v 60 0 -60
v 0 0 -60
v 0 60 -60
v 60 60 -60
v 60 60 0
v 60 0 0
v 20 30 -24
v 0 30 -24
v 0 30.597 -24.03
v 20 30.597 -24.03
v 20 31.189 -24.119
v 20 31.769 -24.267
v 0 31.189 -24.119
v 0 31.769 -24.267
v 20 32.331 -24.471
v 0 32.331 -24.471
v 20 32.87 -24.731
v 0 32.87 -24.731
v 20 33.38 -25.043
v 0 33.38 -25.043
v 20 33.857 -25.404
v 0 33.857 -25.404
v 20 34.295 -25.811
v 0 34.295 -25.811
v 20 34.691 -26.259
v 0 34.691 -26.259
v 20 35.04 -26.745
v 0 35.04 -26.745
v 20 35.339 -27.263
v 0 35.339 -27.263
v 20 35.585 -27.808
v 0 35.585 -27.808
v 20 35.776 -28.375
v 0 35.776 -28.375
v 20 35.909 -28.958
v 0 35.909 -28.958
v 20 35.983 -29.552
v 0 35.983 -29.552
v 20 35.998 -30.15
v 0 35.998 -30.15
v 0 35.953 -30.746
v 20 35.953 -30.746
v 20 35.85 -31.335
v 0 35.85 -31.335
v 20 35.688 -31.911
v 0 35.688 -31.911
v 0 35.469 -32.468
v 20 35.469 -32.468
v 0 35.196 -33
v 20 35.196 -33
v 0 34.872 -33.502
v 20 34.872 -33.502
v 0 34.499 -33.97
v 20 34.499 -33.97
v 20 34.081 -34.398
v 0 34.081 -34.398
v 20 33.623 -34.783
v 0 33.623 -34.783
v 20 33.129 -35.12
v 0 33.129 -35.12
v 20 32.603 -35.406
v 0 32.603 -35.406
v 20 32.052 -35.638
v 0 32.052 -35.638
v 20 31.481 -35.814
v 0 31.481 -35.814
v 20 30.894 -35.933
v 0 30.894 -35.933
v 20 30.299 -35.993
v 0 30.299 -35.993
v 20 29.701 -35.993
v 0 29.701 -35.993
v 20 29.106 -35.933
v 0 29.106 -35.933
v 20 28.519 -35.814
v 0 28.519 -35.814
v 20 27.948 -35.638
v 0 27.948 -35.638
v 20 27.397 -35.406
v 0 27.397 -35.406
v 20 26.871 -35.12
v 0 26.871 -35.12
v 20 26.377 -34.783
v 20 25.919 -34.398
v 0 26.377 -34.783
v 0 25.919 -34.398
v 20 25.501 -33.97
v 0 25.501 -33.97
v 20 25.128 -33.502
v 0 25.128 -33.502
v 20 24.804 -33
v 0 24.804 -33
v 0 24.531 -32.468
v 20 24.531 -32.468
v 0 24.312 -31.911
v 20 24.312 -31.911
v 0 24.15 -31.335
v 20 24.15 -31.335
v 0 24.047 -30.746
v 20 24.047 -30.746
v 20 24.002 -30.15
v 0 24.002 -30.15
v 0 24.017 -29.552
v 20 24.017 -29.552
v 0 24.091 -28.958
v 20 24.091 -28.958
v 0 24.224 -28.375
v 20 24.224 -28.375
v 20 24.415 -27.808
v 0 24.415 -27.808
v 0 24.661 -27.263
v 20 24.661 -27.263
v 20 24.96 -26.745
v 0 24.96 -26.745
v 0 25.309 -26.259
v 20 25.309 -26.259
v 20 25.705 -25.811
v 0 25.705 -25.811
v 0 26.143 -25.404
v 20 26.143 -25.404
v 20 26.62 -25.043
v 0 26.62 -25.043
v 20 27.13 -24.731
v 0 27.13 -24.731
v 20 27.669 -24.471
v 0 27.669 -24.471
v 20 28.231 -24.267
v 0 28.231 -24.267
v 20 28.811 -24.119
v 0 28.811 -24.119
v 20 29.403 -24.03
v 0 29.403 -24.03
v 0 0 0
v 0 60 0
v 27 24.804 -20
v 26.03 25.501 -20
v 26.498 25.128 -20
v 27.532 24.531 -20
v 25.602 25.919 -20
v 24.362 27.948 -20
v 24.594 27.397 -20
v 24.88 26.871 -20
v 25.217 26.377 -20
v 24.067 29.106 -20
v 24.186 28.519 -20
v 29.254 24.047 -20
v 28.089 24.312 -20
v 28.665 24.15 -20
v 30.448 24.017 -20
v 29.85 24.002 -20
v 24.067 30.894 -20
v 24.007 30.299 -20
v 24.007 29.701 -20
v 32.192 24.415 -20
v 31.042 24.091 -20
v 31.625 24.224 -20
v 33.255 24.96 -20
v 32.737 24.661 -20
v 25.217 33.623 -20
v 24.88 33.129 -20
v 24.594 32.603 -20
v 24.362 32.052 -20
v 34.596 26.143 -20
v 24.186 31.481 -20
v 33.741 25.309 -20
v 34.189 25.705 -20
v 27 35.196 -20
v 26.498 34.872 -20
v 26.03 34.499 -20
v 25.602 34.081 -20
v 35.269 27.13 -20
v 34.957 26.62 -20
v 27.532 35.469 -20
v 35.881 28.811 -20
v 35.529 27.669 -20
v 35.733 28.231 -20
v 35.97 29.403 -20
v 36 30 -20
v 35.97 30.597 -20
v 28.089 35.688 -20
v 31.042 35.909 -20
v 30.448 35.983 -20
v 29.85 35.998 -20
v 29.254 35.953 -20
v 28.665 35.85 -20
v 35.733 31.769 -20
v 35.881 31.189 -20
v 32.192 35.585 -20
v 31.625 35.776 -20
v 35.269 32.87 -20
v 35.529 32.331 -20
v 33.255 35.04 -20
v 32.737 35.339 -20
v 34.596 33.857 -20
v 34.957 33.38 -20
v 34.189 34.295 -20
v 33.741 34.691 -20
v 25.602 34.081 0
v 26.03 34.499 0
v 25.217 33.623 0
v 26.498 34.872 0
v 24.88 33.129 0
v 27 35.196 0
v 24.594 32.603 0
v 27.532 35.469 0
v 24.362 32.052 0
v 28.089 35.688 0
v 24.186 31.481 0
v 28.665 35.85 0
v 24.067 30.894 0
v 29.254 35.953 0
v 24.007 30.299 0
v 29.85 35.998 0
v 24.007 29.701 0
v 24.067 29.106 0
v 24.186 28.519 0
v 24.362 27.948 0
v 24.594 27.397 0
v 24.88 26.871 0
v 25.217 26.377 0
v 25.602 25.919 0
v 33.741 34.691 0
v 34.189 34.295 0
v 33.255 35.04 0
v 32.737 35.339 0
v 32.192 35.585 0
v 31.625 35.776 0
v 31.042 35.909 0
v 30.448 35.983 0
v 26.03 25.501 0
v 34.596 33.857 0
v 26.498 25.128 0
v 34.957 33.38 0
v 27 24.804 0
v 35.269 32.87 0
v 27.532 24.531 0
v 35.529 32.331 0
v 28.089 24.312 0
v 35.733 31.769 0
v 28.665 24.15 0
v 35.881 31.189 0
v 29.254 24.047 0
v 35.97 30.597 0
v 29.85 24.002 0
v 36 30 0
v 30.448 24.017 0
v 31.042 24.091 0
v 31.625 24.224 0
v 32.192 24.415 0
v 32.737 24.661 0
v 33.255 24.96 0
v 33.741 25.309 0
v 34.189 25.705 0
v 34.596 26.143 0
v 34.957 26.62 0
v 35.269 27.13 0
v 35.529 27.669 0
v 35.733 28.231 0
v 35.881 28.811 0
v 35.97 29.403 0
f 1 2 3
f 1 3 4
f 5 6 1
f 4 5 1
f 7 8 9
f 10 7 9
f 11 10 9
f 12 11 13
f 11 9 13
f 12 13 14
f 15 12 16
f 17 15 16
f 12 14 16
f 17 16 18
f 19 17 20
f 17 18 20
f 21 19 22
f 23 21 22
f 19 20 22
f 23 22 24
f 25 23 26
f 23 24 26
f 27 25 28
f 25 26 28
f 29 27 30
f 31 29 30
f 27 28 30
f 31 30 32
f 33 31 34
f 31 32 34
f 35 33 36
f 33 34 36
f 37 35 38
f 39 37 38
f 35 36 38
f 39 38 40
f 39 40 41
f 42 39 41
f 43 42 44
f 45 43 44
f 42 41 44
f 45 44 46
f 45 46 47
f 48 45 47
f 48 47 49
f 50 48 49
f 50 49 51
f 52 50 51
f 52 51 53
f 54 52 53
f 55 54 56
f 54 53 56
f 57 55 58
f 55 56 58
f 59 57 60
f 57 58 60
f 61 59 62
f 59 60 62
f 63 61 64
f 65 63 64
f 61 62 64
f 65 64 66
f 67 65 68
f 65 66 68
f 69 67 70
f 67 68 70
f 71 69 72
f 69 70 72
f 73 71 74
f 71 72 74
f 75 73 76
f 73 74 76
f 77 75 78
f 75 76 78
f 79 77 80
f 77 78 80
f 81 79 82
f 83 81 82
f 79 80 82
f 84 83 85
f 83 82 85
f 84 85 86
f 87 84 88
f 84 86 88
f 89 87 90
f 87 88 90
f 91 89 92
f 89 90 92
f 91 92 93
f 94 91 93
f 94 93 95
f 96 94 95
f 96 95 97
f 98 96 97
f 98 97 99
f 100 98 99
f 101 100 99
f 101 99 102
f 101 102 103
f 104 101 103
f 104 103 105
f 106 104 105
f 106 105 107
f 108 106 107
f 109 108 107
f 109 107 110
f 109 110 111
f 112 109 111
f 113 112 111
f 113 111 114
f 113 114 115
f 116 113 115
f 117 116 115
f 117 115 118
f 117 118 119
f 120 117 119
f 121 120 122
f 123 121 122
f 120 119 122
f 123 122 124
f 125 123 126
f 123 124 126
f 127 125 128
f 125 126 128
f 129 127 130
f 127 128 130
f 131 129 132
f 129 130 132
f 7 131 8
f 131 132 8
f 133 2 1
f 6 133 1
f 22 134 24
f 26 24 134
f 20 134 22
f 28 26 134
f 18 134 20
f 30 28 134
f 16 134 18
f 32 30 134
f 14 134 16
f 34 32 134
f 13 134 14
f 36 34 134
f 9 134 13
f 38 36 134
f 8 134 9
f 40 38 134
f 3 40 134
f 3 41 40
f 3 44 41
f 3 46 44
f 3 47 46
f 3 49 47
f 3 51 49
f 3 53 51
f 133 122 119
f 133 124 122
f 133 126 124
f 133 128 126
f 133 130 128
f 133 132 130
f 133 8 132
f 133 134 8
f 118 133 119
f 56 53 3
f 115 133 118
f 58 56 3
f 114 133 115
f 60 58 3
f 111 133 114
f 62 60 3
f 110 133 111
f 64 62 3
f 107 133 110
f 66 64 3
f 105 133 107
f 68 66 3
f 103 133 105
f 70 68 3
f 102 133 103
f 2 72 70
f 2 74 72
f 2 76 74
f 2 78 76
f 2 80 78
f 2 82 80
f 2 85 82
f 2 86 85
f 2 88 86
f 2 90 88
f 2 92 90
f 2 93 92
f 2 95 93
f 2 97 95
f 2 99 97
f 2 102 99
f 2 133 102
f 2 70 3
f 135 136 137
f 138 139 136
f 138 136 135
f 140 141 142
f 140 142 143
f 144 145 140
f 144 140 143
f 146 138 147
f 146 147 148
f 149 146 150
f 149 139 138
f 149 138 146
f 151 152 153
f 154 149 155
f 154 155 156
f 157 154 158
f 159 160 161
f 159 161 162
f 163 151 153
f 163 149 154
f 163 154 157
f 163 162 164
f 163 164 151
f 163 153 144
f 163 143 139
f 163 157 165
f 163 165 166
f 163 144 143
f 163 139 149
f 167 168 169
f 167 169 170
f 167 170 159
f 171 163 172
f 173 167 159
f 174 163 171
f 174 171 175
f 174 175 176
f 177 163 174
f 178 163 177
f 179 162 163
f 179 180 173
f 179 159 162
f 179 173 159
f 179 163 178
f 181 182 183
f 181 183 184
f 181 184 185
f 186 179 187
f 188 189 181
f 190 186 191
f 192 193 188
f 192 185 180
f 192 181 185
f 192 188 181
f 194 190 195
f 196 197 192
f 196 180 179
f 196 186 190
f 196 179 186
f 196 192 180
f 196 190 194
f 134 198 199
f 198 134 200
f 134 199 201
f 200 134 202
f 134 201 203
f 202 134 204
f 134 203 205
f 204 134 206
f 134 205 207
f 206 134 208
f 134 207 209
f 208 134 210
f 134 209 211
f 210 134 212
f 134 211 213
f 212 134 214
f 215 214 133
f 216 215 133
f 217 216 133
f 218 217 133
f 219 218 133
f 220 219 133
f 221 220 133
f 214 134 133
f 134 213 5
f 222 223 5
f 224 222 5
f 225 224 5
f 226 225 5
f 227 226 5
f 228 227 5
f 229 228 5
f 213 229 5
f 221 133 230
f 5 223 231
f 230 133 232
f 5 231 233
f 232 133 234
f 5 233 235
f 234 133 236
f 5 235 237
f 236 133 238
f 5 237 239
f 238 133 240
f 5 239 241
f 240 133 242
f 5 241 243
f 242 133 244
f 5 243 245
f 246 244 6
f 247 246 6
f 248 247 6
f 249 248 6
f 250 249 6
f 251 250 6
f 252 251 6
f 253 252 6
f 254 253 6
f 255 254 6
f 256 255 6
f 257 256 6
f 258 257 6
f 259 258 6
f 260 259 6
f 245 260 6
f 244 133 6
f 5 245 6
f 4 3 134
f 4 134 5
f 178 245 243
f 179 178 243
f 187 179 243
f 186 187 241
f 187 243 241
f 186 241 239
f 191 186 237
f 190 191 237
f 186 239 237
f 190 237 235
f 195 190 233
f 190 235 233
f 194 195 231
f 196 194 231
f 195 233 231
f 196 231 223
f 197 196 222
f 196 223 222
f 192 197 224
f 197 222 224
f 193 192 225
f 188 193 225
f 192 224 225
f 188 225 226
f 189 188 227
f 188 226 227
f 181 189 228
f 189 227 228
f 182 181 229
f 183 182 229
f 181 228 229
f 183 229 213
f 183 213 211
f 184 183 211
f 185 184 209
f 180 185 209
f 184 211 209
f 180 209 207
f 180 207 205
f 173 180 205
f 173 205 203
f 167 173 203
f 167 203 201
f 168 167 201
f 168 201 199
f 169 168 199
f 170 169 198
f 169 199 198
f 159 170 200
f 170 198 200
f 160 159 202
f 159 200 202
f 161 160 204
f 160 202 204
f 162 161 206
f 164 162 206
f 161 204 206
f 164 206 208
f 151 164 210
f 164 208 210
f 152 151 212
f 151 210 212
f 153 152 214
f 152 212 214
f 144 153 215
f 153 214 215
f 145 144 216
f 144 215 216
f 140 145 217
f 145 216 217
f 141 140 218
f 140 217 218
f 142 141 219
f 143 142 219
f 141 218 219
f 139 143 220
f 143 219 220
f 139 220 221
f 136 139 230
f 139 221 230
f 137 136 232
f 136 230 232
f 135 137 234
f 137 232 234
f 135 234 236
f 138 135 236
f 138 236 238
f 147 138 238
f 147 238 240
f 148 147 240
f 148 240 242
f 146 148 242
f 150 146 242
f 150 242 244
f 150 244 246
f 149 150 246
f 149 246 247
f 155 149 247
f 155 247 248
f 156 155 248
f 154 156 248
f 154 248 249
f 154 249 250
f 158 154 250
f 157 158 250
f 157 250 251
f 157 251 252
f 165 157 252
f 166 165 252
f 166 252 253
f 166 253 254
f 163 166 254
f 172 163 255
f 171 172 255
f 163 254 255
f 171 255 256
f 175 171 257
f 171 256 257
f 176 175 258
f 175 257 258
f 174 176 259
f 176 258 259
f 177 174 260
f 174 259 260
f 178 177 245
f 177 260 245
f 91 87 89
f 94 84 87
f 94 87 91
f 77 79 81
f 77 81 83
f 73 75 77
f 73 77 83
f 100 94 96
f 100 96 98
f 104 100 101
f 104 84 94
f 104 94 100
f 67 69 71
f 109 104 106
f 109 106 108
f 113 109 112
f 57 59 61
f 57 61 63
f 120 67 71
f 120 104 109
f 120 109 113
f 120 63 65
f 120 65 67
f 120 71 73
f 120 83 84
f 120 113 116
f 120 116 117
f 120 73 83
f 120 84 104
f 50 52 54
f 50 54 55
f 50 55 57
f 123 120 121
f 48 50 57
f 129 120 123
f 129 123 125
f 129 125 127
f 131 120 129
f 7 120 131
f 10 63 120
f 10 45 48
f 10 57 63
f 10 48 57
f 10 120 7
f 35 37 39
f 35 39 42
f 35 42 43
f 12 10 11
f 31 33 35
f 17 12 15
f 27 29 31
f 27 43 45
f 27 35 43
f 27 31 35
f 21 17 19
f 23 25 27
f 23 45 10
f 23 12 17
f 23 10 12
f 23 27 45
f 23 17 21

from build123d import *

# Parameters (mm, degrees)
ESQUISSE1_W             = 60
ESQUISSE1_H             = 60
BOSS_EXTRU_1_DEPTH      = 60
ESQUISSE2_R             = 6
ENL_V_MAT_EXTRU_1_DEPTH = 20
ESQUISSE3_R             = 6
ENL_V_MAT_EXTRU_2_DEPTH = 20


with BuildPart() as part:
    # Esquisse1 → Boss.-Extru.1 (new body)
    with BuildSketch(Plane(origin=(0, 0, 0), x_dir=(1, 0, 0), z_dir=(0, 1, 0))):
        with Locations((30, 30)):
            Rectangle(ESQUISSE1_W, ESQUISSE1_H)
    extrude(amount=BOSS_EXTRU_1_DEPTH)

    # Esquisse2 → Enlèv. mat.-Extru.1 (cut)
    with BuildSketch(Plane.XY):
        with Locations((30, 30)):
            Circle(ESQUISSE2_R)
    extrude(amount=-ENL_V_MAT_EXTRU_1_DEPTH, mode=Mode.SUBTRACT)

    # Esquisse3 → Enlèv. mat.-Extru.2 (cut)
    with BuildSketch(Plane.ZY):
        with Locations((-30, 30)):
            Circle(ESQUISSE3_R)
    extrude(amount=-ENL_V_MAT_EXTRU_2_DEPTH, mode=Mode.SUBTRACT)


solid = part.part
